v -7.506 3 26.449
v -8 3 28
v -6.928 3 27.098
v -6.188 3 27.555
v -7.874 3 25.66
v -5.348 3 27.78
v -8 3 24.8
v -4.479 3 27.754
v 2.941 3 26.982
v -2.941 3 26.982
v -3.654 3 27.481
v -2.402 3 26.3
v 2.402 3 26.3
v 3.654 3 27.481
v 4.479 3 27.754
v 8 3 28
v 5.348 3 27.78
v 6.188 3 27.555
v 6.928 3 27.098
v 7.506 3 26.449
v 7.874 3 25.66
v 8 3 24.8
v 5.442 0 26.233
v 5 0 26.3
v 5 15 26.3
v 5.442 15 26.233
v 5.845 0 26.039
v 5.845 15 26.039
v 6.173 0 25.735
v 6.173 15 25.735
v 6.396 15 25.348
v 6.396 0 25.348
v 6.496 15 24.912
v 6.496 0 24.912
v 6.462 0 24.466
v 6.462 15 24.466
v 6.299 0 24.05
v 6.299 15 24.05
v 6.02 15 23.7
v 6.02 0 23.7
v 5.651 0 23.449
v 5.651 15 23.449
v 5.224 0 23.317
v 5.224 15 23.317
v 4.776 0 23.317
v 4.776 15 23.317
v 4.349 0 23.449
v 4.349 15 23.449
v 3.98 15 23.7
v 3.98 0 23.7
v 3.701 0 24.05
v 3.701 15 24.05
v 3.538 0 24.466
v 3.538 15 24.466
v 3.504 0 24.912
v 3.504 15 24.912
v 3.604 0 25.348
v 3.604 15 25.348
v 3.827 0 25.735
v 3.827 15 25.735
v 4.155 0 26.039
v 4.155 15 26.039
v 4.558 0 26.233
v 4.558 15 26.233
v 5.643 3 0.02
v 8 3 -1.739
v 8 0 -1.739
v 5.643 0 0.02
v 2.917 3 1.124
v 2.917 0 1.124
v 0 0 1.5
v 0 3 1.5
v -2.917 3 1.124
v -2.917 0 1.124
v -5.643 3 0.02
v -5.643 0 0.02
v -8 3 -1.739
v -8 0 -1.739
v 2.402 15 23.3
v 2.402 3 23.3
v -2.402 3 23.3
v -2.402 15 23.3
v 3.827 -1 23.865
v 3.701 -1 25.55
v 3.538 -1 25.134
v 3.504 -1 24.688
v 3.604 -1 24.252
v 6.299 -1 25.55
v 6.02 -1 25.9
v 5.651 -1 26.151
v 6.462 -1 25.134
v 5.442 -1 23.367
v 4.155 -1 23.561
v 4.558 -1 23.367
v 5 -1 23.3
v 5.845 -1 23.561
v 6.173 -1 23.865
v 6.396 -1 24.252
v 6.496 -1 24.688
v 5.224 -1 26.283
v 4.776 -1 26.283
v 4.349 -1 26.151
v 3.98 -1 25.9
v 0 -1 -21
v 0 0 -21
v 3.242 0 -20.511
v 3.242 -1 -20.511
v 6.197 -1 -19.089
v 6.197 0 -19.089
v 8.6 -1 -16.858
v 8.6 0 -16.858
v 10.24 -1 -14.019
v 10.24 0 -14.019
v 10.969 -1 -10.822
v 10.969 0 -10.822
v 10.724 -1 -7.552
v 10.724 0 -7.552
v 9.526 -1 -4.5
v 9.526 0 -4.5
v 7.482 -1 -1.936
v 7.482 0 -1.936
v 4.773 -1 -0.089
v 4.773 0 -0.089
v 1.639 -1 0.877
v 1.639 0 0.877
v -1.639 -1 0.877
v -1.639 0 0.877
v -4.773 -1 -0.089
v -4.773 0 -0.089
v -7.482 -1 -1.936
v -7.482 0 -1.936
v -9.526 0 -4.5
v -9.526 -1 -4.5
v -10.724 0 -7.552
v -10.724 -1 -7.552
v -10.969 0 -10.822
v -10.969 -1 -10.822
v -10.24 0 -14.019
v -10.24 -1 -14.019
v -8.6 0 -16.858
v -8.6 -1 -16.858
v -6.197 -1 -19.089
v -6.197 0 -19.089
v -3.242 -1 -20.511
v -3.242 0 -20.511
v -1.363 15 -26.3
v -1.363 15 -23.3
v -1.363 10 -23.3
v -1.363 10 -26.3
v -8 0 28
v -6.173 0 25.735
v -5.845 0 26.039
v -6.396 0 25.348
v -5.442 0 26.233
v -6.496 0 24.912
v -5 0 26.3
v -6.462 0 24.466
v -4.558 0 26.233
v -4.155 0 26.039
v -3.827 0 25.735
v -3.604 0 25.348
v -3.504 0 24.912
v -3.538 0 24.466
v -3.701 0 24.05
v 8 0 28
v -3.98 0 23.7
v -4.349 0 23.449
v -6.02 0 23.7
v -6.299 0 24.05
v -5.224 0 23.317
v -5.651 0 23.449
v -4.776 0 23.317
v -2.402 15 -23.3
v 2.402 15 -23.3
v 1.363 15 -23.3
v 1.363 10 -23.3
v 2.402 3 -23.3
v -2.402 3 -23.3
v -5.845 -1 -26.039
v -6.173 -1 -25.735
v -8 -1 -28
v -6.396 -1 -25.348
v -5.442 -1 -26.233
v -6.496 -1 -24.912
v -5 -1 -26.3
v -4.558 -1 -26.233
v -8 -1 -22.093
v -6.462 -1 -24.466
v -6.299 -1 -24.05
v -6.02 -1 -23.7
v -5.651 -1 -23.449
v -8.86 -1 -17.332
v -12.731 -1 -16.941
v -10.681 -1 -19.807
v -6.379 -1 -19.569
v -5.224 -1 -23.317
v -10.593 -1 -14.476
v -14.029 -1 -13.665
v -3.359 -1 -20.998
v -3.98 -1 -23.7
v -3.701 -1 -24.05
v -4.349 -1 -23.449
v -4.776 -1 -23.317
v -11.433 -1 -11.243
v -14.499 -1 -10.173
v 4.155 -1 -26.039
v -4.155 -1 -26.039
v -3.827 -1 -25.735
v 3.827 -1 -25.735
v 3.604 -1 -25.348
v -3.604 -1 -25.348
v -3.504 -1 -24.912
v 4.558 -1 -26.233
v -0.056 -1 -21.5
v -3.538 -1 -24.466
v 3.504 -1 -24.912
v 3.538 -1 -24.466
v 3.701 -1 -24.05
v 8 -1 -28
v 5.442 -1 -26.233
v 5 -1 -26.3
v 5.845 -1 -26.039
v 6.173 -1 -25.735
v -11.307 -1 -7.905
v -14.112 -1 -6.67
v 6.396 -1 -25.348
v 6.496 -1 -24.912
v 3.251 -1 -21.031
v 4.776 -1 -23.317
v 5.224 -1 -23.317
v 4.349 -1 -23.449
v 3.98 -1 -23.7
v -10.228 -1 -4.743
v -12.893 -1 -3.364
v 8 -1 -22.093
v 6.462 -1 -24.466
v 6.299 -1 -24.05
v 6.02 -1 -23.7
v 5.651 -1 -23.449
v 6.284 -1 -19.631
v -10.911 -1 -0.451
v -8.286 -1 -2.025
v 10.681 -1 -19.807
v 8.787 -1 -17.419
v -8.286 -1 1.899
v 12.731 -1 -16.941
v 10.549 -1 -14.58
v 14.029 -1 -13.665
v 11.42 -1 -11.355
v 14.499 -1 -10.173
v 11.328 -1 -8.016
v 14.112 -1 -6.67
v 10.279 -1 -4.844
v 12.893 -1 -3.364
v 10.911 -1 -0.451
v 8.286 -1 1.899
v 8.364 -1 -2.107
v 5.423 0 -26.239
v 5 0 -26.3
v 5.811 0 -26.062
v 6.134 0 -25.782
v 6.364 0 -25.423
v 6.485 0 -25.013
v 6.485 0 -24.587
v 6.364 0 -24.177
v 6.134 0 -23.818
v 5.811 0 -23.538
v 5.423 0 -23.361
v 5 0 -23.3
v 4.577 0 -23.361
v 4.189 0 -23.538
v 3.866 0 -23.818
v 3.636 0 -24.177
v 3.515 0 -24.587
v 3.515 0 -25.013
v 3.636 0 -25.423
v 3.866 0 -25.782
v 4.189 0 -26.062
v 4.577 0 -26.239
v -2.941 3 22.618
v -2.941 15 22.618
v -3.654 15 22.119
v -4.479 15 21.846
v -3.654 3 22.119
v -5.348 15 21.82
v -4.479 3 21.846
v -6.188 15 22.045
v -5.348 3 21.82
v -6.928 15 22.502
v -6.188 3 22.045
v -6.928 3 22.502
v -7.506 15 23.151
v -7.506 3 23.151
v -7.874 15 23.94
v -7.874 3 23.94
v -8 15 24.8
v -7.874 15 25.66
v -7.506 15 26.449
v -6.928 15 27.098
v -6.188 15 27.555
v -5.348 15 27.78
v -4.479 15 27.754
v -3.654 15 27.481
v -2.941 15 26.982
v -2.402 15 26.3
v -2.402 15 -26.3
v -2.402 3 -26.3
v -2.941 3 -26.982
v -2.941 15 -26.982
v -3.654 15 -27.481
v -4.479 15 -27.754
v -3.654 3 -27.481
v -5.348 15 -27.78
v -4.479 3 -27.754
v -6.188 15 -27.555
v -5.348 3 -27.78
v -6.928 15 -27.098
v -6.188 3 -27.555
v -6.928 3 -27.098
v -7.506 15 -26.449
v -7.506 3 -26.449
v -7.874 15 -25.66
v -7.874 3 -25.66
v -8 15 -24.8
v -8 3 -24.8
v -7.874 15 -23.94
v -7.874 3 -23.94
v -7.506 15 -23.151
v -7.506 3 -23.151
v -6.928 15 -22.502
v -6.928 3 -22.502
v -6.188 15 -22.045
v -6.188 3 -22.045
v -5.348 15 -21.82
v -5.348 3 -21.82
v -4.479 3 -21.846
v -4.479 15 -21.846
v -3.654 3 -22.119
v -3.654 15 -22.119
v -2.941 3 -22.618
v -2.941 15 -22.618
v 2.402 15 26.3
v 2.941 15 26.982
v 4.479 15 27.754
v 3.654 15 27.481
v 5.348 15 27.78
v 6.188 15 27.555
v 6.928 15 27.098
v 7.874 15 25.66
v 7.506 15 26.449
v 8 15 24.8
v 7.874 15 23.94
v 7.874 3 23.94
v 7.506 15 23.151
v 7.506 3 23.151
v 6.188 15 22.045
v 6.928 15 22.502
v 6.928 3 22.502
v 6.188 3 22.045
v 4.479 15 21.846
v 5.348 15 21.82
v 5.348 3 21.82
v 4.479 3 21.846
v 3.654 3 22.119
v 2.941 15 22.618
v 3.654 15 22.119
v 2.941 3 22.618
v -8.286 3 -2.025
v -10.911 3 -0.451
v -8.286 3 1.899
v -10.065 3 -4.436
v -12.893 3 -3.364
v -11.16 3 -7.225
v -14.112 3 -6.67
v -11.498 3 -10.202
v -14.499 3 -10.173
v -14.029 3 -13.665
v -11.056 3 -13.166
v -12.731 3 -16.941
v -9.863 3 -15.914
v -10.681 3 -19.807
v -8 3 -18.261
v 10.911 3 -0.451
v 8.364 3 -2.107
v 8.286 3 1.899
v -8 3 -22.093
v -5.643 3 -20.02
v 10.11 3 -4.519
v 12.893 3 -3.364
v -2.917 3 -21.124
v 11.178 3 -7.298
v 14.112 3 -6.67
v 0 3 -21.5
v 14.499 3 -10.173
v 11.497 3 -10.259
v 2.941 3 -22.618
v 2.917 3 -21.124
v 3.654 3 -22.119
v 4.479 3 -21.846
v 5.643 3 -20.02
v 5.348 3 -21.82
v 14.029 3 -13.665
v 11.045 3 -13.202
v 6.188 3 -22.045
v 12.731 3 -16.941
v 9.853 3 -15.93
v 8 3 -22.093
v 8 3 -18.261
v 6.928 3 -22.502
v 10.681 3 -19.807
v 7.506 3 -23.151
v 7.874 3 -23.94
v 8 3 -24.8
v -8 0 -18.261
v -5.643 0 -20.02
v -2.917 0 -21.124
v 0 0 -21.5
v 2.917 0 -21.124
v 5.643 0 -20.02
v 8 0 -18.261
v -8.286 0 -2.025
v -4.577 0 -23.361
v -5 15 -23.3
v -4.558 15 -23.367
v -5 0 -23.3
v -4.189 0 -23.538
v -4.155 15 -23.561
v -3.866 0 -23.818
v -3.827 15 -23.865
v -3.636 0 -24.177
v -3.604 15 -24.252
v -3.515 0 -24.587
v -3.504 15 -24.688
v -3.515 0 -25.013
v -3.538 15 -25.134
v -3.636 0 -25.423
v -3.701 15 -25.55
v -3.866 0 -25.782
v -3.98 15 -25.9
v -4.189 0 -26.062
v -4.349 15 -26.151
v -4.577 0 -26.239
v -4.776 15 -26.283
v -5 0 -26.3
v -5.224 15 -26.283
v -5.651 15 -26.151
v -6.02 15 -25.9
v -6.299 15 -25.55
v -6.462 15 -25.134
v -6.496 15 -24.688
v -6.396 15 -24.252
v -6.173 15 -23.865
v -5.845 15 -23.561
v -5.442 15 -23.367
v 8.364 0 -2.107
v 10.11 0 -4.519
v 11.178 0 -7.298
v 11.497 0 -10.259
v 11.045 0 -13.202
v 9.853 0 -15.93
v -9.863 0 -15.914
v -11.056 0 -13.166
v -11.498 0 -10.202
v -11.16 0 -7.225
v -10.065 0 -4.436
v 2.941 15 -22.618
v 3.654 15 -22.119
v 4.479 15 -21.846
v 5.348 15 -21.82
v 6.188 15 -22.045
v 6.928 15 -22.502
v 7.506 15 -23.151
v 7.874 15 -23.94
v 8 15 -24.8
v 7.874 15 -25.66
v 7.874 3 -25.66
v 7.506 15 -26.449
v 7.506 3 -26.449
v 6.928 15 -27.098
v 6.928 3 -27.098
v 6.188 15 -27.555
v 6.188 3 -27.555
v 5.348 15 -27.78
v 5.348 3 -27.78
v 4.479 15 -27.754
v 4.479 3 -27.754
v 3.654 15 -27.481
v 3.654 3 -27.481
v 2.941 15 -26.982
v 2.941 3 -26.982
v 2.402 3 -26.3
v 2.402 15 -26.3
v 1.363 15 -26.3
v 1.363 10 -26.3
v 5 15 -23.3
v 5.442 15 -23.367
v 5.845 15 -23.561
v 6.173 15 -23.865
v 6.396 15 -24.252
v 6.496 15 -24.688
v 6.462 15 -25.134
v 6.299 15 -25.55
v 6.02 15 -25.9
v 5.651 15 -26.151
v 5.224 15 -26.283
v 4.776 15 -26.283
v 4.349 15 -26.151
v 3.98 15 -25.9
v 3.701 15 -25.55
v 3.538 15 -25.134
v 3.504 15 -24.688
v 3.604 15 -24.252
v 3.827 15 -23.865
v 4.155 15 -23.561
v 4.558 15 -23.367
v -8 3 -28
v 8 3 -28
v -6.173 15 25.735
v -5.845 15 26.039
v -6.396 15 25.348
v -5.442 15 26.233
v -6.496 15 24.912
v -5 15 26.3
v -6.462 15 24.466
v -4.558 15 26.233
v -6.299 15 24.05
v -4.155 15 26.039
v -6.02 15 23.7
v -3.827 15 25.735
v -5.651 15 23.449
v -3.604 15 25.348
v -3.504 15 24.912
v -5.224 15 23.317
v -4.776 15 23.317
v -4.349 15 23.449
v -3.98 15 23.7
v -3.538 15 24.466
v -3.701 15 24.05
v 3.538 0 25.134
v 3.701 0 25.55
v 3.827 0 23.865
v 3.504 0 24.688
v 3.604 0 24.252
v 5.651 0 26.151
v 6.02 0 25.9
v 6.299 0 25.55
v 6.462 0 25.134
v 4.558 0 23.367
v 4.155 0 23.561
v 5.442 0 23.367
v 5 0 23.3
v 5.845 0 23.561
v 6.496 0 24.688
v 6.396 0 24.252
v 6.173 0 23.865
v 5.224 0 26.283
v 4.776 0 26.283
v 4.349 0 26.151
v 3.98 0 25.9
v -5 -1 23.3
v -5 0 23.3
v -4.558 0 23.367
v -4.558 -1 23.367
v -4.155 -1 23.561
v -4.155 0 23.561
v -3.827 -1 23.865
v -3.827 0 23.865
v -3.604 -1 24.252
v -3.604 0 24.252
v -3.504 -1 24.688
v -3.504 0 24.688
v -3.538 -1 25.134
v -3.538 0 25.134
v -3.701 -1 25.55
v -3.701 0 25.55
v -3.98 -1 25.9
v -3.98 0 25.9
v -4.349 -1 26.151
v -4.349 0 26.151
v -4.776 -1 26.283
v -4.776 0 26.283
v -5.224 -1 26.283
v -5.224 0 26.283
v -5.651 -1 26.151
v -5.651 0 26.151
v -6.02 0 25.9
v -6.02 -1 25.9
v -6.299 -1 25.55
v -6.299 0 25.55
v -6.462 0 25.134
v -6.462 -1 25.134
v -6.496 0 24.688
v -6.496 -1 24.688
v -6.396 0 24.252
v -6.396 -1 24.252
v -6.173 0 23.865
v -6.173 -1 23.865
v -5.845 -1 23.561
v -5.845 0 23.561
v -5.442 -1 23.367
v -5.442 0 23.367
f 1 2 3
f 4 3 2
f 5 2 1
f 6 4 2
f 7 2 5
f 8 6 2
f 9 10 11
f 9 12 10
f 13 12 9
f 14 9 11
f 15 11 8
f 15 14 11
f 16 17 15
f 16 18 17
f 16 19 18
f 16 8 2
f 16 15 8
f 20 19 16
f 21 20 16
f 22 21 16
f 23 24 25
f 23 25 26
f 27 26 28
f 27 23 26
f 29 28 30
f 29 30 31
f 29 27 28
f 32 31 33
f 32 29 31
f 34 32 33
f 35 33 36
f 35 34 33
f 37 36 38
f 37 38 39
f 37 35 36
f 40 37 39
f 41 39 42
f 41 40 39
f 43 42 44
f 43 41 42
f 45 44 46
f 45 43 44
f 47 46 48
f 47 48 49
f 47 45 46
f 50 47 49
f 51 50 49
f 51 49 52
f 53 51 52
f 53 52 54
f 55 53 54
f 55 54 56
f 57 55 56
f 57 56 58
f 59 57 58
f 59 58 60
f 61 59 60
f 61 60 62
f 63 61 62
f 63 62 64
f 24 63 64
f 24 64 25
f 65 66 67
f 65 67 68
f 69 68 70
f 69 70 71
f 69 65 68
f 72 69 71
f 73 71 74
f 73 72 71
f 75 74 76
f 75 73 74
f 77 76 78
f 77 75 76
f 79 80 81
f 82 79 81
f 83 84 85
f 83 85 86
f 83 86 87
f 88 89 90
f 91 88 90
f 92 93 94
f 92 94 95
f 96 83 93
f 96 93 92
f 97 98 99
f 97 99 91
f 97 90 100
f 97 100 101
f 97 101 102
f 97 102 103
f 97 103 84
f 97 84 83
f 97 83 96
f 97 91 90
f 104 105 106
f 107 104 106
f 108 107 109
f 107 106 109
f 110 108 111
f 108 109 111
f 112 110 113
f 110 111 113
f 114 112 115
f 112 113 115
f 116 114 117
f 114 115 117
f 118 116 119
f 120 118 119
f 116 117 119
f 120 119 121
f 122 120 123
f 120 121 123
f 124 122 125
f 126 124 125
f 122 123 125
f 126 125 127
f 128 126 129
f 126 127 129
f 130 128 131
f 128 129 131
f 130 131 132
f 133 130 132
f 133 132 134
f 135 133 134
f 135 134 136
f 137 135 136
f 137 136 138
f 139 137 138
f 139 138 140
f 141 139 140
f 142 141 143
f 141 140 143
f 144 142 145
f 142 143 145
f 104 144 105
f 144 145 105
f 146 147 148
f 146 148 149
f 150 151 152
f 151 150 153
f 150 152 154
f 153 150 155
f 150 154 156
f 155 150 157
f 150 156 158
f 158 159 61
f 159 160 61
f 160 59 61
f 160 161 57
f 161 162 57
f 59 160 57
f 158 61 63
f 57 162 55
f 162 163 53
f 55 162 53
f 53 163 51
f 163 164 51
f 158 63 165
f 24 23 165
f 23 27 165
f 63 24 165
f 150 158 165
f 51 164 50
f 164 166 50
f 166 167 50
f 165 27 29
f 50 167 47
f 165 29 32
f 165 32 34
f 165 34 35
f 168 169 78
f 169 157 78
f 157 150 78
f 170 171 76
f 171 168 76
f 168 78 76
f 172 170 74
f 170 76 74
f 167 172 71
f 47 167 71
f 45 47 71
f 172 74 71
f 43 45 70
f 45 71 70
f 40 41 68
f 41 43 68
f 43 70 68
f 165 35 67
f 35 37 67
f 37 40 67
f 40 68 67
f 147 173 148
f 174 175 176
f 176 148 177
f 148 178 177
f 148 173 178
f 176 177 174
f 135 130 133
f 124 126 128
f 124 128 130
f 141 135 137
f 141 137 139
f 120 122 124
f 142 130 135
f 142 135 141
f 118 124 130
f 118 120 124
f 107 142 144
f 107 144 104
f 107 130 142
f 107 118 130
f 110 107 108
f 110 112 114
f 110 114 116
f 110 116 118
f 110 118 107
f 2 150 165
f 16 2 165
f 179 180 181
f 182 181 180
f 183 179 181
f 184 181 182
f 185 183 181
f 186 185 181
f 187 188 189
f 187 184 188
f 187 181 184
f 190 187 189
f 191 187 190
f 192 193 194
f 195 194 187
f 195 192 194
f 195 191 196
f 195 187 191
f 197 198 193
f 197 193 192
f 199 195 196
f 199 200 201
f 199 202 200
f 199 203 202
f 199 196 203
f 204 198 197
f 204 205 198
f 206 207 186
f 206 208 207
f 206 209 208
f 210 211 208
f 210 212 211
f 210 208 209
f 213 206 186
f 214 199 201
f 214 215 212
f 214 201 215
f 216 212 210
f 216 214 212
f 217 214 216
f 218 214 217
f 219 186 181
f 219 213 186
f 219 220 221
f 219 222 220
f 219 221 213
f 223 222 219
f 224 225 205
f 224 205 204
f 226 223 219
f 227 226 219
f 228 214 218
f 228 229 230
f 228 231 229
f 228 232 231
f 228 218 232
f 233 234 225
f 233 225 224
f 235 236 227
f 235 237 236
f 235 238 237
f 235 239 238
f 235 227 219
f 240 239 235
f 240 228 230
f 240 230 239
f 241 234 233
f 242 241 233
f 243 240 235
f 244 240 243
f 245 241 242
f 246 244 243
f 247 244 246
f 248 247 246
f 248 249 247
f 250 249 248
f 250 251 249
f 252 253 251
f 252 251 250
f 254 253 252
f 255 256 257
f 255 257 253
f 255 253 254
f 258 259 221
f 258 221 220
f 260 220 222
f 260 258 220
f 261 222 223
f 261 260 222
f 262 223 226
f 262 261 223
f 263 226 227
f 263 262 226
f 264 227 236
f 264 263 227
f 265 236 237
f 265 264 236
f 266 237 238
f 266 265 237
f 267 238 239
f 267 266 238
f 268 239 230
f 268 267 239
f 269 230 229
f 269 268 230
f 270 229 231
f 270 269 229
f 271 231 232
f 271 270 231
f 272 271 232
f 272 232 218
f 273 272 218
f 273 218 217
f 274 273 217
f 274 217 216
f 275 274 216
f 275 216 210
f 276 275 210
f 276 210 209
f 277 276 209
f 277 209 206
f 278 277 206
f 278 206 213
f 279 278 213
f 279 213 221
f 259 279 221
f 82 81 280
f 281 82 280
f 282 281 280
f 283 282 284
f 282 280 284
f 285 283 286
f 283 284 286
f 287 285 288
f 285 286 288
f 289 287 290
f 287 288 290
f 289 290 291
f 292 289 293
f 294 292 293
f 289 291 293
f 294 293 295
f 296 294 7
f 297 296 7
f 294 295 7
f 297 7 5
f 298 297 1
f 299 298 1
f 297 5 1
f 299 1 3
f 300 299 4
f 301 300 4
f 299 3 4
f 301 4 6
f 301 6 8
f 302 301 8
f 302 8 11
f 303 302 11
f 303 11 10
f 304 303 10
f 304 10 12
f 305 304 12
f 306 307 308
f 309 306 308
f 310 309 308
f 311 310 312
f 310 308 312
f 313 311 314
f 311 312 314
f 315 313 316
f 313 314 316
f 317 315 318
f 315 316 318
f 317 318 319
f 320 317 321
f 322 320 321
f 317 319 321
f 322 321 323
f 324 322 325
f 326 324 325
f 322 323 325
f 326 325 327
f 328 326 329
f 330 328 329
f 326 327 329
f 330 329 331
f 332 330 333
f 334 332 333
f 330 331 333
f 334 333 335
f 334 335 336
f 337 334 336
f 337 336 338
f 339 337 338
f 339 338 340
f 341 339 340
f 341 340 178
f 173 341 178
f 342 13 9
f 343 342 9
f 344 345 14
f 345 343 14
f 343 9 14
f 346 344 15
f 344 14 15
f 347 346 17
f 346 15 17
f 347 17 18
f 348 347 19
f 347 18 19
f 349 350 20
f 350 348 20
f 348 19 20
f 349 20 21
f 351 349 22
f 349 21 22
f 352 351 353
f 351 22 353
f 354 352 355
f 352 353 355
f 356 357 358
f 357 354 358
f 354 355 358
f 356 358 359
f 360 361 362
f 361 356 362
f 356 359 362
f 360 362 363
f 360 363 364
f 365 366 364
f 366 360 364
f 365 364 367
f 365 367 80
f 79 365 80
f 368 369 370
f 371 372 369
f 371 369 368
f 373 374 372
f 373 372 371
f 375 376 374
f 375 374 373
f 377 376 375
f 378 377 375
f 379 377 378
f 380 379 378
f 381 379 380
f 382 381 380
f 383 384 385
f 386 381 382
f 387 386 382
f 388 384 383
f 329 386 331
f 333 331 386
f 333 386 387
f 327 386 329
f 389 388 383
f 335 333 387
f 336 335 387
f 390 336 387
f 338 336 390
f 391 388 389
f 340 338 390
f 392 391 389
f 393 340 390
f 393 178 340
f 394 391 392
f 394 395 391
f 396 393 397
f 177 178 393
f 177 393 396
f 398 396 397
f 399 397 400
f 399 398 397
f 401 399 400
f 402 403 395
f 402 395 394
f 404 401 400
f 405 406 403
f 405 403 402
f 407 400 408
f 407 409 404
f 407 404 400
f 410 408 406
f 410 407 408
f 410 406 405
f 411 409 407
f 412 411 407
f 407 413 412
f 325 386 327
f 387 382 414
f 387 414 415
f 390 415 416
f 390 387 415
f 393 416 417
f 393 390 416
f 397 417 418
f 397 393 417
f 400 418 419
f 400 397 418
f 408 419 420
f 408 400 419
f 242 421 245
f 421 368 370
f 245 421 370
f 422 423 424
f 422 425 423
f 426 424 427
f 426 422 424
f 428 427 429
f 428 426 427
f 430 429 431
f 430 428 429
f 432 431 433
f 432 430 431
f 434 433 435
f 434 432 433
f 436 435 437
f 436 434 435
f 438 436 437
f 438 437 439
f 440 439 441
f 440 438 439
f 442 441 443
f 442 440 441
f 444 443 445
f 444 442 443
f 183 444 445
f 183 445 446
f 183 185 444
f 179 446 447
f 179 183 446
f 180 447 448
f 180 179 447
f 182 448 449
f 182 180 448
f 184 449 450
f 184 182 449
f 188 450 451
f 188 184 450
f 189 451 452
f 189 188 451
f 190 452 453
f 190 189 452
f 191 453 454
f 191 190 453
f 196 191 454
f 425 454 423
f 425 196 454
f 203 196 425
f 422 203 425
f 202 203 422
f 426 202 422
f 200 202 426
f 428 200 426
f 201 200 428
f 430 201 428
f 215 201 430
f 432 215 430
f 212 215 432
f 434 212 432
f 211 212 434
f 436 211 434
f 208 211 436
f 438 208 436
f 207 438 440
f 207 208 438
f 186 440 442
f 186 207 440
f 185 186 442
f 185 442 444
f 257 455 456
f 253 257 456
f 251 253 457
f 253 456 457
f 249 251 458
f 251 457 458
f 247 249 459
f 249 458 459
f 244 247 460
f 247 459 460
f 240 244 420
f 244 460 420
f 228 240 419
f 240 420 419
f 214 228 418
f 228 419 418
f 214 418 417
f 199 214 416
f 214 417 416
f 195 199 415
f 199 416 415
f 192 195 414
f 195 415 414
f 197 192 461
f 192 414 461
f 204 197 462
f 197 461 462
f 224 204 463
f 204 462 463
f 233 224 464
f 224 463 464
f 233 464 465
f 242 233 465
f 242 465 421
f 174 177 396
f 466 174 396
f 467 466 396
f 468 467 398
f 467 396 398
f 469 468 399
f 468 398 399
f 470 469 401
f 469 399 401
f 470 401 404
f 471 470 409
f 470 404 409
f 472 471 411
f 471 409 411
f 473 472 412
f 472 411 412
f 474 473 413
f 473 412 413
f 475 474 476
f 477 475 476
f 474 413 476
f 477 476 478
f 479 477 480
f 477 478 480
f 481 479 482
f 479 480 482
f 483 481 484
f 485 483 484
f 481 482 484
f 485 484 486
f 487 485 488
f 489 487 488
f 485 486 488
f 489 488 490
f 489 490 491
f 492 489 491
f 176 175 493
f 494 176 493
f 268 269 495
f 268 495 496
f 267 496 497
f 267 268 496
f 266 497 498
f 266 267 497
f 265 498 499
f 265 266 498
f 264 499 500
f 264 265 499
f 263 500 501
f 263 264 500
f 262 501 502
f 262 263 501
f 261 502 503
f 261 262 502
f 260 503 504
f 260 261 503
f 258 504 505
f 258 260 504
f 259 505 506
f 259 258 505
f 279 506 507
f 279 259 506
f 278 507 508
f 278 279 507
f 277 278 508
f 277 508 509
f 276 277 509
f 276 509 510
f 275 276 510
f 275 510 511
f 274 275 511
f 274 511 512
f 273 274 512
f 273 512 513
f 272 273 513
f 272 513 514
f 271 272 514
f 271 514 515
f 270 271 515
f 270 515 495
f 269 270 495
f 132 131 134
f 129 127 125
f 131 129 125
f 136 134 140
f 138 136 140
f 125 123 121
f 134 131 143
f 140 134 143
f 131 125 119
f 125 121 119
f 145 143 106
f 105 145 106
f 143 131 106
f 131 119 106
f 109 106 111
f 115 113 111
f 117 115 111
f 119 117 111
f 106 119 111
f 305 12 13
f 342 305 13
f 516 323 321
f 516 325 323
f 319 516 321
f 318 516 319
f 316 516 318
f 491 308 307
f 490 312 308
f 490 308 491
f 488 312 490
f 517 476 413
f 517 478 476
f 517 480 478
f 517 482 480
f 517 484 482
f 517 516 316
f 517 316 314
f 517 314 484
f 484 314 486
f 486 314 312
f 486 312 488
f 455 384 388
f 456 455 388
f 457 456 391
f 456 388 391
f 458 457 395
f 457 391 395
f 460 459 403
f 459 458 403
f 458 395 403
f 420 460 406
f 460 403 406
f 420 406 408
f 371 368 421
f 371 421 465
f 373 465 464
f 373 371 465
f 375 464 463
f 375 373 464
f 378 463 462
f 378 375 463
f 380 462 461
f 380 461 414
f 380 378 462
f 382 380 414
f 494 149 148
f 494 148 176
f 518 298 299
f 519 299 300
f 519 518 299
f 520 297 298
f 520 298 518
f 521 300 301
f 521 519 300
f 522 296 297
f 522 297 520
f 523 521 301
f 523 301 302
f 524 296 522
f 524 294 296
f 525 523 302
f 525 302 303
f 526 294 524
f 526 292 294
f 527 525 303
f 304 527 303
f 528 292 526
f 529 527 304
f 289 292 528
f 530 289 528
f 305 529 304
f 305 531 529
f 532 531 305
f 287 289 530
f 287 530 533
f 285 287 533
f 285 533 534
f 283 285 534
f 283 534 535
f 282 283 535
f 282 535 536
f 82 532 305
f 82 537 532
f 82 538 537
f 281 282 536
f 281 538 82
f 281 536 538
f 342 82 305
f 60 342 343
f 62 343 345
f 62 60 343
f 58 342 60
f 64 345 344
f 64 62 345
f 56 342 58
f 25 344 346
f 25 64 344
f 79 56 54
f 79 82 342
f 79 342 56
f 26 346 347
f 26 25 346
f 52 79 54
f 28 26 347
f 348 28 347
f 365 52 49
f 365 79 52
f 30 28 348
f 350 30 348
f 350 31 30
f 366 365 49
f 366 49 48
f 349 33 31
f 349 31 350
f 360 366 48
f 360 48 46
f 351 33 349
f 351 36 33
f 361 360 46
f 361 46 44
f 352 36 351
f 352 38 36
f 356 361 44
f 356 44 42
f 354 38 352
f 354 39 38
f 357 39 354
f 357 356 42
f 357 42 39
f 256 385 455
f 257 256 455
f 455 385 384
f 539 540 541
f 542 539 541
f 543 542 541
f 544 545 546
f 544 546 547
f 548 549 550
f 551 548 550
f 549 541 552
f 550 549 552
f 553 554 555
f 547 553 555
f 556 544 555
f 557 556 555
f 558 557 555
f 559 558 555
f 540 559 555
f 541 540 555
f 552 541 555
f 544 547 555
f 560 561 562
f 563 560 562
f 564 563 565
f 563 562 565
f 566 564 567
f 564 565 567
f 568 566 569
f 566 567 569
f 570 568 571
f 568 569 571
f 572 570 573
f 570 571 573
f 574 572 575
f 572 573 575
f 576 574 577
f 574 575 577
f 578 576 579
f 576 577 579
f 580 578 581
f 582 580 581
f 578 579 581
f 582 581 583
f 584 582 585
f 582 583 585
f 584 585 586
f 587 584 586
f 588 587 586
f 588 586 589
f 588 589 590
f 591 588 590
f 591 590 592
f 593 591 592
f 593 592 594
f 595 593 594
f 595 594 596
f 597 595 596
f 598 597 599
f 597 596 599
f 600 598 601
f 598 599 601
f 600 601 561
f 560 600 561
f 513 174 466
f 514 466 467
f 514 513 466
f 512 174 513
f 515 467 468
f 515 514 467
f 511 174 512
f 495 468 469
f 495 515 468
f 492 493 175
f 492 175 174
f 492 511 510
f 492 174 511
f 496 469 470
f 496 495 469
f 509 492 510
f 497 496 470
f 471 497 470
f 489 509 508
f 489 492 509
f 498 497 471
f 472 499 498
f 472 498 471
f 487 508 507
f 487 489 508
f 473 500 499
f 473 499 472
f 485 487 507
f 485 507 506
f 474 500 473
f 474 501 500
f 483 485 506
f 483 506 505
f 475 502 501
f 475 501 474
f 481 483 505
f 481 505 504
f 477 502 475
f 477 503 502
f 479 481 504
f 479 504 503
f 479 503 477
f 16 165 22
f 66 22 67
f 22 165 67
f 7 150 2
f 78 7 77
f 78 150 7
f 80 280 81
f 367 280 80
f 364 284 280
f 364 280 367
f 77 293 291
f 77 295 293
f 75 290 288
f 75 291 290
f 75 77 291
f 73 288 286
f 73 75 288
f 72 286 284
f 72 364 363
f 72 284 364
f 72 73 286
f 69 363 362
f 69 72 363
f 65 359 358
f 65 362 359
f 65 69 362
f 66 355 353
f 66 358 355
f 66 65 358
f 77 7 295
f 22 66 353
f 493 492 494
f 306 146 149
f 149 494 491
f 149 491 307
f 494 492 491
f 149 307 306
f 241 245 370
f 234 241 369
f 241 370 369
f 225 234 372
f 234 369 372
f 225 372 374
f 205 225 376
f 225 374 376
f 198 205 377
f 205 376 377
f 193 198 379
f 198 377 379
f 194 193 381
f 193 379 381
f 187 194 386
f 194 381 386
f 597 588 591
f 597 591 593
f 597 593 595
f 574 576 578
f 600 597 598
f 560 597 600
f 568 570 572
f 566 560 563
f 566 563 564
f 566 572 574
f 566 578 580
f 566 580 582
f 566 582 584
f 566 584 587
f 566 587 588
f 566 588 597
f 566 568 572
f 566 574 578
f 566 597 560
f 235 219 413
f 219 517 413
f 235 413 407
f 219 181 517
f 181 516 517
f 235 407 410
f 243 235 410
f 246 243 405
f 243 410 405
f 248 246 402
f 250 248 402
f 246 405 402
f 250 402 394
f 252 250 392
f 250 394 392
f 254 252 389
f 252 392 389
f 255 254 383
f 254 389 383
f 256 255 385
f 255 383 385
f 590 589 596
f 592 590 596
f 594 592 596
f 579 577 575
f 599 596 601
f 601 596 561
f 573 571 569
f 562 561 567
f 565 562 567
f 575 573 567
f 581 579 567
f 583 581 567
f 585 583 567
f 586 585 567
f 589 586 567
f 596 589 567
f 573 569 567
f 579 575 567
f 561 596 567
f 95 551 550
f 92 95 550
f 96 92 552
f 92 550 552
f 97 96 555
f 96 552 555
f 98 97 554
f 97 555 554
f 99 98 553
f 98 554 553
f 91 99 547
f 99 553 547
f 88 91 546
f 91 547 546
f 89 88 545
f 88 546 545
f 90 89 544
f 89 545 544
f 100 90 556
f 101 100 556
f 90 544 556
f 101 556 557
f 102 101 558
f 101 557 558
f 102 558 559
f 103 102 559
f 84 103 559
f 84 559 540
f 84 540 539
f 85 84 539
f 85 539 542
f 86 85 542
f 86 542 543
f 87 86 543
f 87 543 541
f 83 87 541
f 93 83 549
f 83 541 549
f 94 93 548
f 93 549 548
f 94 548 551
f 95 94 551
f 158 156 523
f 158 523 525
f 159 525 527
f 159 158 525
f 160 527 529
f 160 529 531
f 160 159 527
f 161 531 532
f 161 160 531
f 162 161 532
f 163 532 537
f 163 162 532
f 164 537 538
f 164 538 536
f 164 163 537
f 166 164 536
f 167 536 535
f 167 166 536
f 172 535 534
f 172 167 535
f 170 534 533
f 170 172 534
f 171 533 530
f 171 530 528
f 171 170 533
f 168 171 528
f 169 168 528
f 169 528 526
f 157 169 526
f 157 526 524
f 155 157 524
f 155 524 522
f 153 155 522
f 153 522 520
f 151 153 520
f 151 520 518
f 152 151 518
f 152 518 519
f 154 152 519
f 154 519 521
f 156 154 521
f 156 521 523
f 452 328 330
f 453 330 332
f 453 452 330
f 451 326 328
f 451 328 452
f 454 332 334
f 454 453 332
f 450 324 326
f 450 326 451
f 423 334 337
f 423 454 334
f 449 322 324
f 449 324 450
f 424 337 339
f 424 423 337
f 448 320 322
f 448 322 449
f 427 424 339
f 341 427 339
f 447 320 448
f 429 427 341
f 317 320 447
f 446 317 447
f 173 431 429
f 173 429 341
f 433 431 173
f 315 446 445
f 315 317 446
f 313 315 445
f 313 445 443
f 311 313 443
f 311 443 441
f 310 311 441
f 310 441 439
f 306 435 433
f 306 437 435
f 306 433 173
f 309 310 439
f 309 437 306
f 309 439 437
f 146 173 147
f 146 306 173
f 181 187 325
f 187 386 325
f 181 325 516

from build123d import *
from build123d.topology import SkipClean

# Parameters (mm, degrees)
SKETCH_1_W          = 16
SKETCH_1_H          = 56
SKETCH_1_R          = 1.5
EXTRUDE_1_DEPTH     = 3
SKETCH_2_R          = 3
SKETCH_2_R_2        = 1.5
EXTRUDE_3_DEPTH     = 12
EXTRUDE_4_DEPTH     = 3
CUT_EXTRUDE_START   = -3
SKETCH_5_R          = 11.5
CUT_EXTRUDE_1_DEPTH = 3
SKETCH_6_W          = 2.725103142
SKETCH_6_H          = 52.6
CUT_EXTRUDE_2_DEPTH = 5
SKETCH_7_R          = 1.5
SKETCH_7_R_2        = 11
EXTRUDE_5_DEPTH     = 1


with BuildPart() as part:
    # 草图1 → 凸台-拉伸1 (new body)
    with BuildSketch(Plane(origin=(0, 0, 0), x_dir=(1, 0, 0), z_dir=(0, 1, 0))):
        Rectangle(SKETCH_1_W, SKETCH_1_H)
        with Locations(Location((-5, 24.8, 0), (0, 0, 270))):
            Circle(SKETCH_1_R, mode=Mode.SUBTRACT)
        with Locations(Location((5, 24.8, 0), (0, 0, 270))):
            Circle(SKETCH_1_R, mode=Mode.SUBTRACT)
        with Locations(Location((5, -24.8, 0), (0, 0, 270))):
            Circle(SKETCH_1_R, mode=Mode.SUBTRACT)
        with Locations(Location((-5, -24.8, 0), (0, 0, 270))):
            Circle(SKETCH_1_R, mode=Mode.SUBTRACT)
    extrude(amount=EXTRUDE_1_DEPTH)

    # 草图2 → 凸台-拉伸3 (add)
    # profile 1 of 6: a face of its own
    with BuildSketch(Plane(origin=(0, 3, 0), x_dir=(1, 0, 0), z_dir=(0, 1, 0))):
        with Locations((-5, 24.8)):
            Circle(SKETCH_2_R)
        with Locations(Location((-5, 24.8, 0), (0, 0, 270))):
            Circle(SKETCH_2_R_2, mode=Mode.SUBTRACT)
    # profile 2 of 6: a face of its own
    with BuildSketch(Plane(origin=(0, 3, 0), x_dir=(1, 0, 0), z_dir=(0, 1, 0))):
        with BuildLine():
            Line((2.401923789, 26.3), (-2.401923789, 26.3))
            ThreePointArc((-2.401923789, 26.3), (-2.102222521, 25.576457135), (-2, 24.8))
            ThreePointArc((-2, 24.8), (-2.102222521, 24.023542865), (-2.401923789, 23.3))
            Line((-2.401923789, 23.3), (2.401923789, 23.3))
            ThreePointArc((2.401923789, 23.3), (2, 24.8), (2.401923789, 26.3))
        make_face()
    # profile 3 of 6: a face of its own
    with BuildSketch(Plane(origin=(0, 3, 0), x_dir=(1, 0, 0), z_dir=(0, 1, 0))):
        with Locations((5, 24.8)):
            Circle(SKETCH_2_R)
        with Locations(Location((5, 24.8, 0), (0, 0, 270))):
            Circle(SKETCH_2_R_2, mode=Mode.SUBTRACT)
    # profile 4 of 6: a face of its own
    with BuildSketch(Plane(origin=(0, 3, 0), x_dir=(1, 0, 0), z_dir=(0, 1, 0))):
        with Locations((-5, -24.8)):
            Circle(SKETCH_2_R)
        with Locations(Location((-5, -24.8, 0), (0, 0, 270))):
            Circle(SKETCH_2_R_2, mode=Mode.SUBTRACT)
    # profile 5 of 6: a face of its own
    with BuildSketch(Plane(origin=(0, 3, 0), x_dir=(1, 0, 0), z_dir=(0, 1, 0))):
        with BuildLine():
            Line((2.401923789, -23.3), (-2.401923789, -23.3))
            ThreePointArc((-2.401923789, -23.3), (-2.102222521, -24.023542865), (-2, -24.8))
            ThreePointArc((-2, -24.8), (-2.102222521, -25.576457135), (-2.401923789, -26.3))
            Line((-2.401923789, -26.3), (2.401923789, -26.3))
            ThreePointArc((2.401923789, -26.3), (2, -24.8), (2.401923789, -23.3))
        make_face()
    # profile 6 of 6: a face of its own
    with BuildSketch(Plane(origin=(0, 3, 0), x_dir=(1, 0, 0), z_dir=(0, 1, 0))):
        with Locations((5, -24.8)):
            Circle(SKETCH_2_R)
        with Locations(Location((5, -24.8, 0), (0, 0, 270))):
            Circle(SKETCH_2_R_2, mode=Mode.SUBTRACT)
    extrude(amount=EXTRUDE_3_DEPTH)

    # 草图3 → 凸台-拉伸4 (add)
    with BuildSketch(Plane(origin=(0, 3, 0), x_dir=(1, 0, 0), z_dir=(0, 1, 0))):
        with BuildLine():
            Line((8, 18.261355821), (8, 22.093386622))
            ThreePointArc((8, 22.093386622), (14.498972001, 10.172658335), (8.285714286, -1.899451196))
            Line((8.285714286, -1.899451196), (8.363636364, 2.106991272))
            ThreePointArc((8.363636364, 2.106991272), (11.497087555, 10.258800592), (8, 18.261355821))
        make_face()
        with BuildLine():
            Line((-8.285714286, -1.899451196), (-8.285714286, 2.025231115))
            ThreePointArc((-8.285714286, 2.025231115), (-11.498219811, 10.202339272), (-8, 18.261355821))
            Line((-8, 18.261355821), (-8, 22.093386622))
            ThreePointArc((-8, 22.093386622), (-14.498972001, 10.172658335), (-8.285714286, -1.899451196))
        make_face()
    extrude(amount=-EXTRUDE_4_DEPTH)

    # 草图5 → 切除-拉伸1 (cut)
    with SkipClean():  # the faces are left unmerged after this step: merging them gives an invalid solid
        with BuildSketch(Plane.XZ.offset(CUT_EXTRUDE_START)):
            with Locations((0, -10)):
                Circle(SKETCH_5_R)
        extrude(amount=CUT_EXTRUDE_1_DEPTH, mode=Mode.SUBTRACT)


with BuildPart() as cut_extrude_1_piece_1:
    # of the separate pieces the step leaves, piece 1, a body of its own (cut_extrude_1_pieces)
    add(part.part.solids().sort_by_distance((-8, 0, 28))[0])


with BuildPart() as cut_extrude_1_piece_2:
    # of the separate pieces the step leaves, piece 2, a body of its own (cut_extrude_1_pieces)
    add(part.part.solids().sort_by_distance((-8, 0, -28))[0])

    # 草图6 → 切除-拉伸2 (cut)
    with SkipClean():  # the faces are left unmerged after this step: merging them gives an invalid solid
        with BuildSketch(Plane(origin=(0, 15, 0), x_dir=(1, 0, 0), z_dir=(0, 1, 0))):
            Rectangle(SKETCH_6_W, SKETCH_6_H)
        extrude(amount=-CUT_EXTRUDE_2_DEPTH, mode=Mode.SUBTRACT)

    # 草图7 → 凸台-拉伸5 (add)
    # profile 1 of 4: a face of its own
    with BuildSketch(Plane.XZ):
        with Locations(Location((-5, 24.8, 0), (0, 0, 270))):
            Circle(SKETCH_7_R)
    # profile 2 of 4: a face of its own
    with BuildSketch(Plane.XZ):
        with Locations(Location((5, 24.8, 0), (0, 0, 270))):
            Circle(SKETCH_7_R)
    # profile 3 of 4: a face of its own
    with BuildSketch(Plane.XZ):
        with Locations(Location((0, -10, 0), (0, 0, 270))):
            Circle(SKETCH_7_R_2)
    # profile 4 of 4: a face of its own
    with BuildSketch(Plane.XZ):
        with BuildLine():
            Line((-8.285714286, -2.025231115), (-8.285714286, 1.899451196))
            ThreePointArc((-8.285714286, 1.899451196), (-14.498972001, -10.172658335), (-8, -22.093386622))
            Line((-8, -22.093386622), (-8, -28))
            Line((-8, -28), (8, -28))
            Line((8, -28), (8, -22.093386622))
            ThreePointArc((8, -22.093386622), (14.498972001, -10.172658335), (8.285714286, 1.899451196))
            Line((8.285714286, 1.899451196), (8.363636364, -2.106991272))
            ThreePointArc((8.363636364, -2.106991272), (-0.056472501, -21.499861341), (-8.285714286, -2.025231115))
        make_face()
        with Locations(Location((-5, -24.8, 0), (0, 0, 270))):
            Circle(SKETCH_7_R, mode=Mode.SUBTRACT)
        with Locations(Location((5, -24.8, 0), (0, 0, 270))):
            Circle(SKETCH_7_R, mode=Mode.SUBTRACT)
    extrude(amount=EXTRUDE_5_DEPTH)


with BuildPart() as extrude_5_piece_1:
    # of the separate pieces the step leaves, piece 1, a body of its own (extrude_5_pieces)
    add(cut_extrude_1_piece_2.part.solids().sort_by_distance((-8, 3, -28))[0])


with BuildPart() as extrude_5_piece_2:
    # of the separate pieces the step leaves, piece 2, a body of its own (extrude_5_pieces)
    add(cut_extrude_1_piece_2.part.solids().sort_by_distance((0, 0, -21))[0])


with BuildPart() as extrude_5_piece_3:
    # of the separate pieces the step leaves, piece 3, a body of its own (extrude_5_pieces)
    add(cut_extrude_1_piece_2.part.solids().sort_by_distance((-5, 0, 23.3))[0])


with BuildPart() as extrude_5_piece_4:
    # of the separate pieces the step leaves, piece 4, a body of its own (extrude_5_pieces)
    add(cut_extrude_1_piece_2.part.solids().sort_by_distance((5, 0, 23.3))[0])


solid = Compound([cut_extrude_1_piece_1.part, extrude_5_piece_1.part, extrude_5_piece_2.part, extrude_5_piece_3.part, extrude_5_piece_4.part])
